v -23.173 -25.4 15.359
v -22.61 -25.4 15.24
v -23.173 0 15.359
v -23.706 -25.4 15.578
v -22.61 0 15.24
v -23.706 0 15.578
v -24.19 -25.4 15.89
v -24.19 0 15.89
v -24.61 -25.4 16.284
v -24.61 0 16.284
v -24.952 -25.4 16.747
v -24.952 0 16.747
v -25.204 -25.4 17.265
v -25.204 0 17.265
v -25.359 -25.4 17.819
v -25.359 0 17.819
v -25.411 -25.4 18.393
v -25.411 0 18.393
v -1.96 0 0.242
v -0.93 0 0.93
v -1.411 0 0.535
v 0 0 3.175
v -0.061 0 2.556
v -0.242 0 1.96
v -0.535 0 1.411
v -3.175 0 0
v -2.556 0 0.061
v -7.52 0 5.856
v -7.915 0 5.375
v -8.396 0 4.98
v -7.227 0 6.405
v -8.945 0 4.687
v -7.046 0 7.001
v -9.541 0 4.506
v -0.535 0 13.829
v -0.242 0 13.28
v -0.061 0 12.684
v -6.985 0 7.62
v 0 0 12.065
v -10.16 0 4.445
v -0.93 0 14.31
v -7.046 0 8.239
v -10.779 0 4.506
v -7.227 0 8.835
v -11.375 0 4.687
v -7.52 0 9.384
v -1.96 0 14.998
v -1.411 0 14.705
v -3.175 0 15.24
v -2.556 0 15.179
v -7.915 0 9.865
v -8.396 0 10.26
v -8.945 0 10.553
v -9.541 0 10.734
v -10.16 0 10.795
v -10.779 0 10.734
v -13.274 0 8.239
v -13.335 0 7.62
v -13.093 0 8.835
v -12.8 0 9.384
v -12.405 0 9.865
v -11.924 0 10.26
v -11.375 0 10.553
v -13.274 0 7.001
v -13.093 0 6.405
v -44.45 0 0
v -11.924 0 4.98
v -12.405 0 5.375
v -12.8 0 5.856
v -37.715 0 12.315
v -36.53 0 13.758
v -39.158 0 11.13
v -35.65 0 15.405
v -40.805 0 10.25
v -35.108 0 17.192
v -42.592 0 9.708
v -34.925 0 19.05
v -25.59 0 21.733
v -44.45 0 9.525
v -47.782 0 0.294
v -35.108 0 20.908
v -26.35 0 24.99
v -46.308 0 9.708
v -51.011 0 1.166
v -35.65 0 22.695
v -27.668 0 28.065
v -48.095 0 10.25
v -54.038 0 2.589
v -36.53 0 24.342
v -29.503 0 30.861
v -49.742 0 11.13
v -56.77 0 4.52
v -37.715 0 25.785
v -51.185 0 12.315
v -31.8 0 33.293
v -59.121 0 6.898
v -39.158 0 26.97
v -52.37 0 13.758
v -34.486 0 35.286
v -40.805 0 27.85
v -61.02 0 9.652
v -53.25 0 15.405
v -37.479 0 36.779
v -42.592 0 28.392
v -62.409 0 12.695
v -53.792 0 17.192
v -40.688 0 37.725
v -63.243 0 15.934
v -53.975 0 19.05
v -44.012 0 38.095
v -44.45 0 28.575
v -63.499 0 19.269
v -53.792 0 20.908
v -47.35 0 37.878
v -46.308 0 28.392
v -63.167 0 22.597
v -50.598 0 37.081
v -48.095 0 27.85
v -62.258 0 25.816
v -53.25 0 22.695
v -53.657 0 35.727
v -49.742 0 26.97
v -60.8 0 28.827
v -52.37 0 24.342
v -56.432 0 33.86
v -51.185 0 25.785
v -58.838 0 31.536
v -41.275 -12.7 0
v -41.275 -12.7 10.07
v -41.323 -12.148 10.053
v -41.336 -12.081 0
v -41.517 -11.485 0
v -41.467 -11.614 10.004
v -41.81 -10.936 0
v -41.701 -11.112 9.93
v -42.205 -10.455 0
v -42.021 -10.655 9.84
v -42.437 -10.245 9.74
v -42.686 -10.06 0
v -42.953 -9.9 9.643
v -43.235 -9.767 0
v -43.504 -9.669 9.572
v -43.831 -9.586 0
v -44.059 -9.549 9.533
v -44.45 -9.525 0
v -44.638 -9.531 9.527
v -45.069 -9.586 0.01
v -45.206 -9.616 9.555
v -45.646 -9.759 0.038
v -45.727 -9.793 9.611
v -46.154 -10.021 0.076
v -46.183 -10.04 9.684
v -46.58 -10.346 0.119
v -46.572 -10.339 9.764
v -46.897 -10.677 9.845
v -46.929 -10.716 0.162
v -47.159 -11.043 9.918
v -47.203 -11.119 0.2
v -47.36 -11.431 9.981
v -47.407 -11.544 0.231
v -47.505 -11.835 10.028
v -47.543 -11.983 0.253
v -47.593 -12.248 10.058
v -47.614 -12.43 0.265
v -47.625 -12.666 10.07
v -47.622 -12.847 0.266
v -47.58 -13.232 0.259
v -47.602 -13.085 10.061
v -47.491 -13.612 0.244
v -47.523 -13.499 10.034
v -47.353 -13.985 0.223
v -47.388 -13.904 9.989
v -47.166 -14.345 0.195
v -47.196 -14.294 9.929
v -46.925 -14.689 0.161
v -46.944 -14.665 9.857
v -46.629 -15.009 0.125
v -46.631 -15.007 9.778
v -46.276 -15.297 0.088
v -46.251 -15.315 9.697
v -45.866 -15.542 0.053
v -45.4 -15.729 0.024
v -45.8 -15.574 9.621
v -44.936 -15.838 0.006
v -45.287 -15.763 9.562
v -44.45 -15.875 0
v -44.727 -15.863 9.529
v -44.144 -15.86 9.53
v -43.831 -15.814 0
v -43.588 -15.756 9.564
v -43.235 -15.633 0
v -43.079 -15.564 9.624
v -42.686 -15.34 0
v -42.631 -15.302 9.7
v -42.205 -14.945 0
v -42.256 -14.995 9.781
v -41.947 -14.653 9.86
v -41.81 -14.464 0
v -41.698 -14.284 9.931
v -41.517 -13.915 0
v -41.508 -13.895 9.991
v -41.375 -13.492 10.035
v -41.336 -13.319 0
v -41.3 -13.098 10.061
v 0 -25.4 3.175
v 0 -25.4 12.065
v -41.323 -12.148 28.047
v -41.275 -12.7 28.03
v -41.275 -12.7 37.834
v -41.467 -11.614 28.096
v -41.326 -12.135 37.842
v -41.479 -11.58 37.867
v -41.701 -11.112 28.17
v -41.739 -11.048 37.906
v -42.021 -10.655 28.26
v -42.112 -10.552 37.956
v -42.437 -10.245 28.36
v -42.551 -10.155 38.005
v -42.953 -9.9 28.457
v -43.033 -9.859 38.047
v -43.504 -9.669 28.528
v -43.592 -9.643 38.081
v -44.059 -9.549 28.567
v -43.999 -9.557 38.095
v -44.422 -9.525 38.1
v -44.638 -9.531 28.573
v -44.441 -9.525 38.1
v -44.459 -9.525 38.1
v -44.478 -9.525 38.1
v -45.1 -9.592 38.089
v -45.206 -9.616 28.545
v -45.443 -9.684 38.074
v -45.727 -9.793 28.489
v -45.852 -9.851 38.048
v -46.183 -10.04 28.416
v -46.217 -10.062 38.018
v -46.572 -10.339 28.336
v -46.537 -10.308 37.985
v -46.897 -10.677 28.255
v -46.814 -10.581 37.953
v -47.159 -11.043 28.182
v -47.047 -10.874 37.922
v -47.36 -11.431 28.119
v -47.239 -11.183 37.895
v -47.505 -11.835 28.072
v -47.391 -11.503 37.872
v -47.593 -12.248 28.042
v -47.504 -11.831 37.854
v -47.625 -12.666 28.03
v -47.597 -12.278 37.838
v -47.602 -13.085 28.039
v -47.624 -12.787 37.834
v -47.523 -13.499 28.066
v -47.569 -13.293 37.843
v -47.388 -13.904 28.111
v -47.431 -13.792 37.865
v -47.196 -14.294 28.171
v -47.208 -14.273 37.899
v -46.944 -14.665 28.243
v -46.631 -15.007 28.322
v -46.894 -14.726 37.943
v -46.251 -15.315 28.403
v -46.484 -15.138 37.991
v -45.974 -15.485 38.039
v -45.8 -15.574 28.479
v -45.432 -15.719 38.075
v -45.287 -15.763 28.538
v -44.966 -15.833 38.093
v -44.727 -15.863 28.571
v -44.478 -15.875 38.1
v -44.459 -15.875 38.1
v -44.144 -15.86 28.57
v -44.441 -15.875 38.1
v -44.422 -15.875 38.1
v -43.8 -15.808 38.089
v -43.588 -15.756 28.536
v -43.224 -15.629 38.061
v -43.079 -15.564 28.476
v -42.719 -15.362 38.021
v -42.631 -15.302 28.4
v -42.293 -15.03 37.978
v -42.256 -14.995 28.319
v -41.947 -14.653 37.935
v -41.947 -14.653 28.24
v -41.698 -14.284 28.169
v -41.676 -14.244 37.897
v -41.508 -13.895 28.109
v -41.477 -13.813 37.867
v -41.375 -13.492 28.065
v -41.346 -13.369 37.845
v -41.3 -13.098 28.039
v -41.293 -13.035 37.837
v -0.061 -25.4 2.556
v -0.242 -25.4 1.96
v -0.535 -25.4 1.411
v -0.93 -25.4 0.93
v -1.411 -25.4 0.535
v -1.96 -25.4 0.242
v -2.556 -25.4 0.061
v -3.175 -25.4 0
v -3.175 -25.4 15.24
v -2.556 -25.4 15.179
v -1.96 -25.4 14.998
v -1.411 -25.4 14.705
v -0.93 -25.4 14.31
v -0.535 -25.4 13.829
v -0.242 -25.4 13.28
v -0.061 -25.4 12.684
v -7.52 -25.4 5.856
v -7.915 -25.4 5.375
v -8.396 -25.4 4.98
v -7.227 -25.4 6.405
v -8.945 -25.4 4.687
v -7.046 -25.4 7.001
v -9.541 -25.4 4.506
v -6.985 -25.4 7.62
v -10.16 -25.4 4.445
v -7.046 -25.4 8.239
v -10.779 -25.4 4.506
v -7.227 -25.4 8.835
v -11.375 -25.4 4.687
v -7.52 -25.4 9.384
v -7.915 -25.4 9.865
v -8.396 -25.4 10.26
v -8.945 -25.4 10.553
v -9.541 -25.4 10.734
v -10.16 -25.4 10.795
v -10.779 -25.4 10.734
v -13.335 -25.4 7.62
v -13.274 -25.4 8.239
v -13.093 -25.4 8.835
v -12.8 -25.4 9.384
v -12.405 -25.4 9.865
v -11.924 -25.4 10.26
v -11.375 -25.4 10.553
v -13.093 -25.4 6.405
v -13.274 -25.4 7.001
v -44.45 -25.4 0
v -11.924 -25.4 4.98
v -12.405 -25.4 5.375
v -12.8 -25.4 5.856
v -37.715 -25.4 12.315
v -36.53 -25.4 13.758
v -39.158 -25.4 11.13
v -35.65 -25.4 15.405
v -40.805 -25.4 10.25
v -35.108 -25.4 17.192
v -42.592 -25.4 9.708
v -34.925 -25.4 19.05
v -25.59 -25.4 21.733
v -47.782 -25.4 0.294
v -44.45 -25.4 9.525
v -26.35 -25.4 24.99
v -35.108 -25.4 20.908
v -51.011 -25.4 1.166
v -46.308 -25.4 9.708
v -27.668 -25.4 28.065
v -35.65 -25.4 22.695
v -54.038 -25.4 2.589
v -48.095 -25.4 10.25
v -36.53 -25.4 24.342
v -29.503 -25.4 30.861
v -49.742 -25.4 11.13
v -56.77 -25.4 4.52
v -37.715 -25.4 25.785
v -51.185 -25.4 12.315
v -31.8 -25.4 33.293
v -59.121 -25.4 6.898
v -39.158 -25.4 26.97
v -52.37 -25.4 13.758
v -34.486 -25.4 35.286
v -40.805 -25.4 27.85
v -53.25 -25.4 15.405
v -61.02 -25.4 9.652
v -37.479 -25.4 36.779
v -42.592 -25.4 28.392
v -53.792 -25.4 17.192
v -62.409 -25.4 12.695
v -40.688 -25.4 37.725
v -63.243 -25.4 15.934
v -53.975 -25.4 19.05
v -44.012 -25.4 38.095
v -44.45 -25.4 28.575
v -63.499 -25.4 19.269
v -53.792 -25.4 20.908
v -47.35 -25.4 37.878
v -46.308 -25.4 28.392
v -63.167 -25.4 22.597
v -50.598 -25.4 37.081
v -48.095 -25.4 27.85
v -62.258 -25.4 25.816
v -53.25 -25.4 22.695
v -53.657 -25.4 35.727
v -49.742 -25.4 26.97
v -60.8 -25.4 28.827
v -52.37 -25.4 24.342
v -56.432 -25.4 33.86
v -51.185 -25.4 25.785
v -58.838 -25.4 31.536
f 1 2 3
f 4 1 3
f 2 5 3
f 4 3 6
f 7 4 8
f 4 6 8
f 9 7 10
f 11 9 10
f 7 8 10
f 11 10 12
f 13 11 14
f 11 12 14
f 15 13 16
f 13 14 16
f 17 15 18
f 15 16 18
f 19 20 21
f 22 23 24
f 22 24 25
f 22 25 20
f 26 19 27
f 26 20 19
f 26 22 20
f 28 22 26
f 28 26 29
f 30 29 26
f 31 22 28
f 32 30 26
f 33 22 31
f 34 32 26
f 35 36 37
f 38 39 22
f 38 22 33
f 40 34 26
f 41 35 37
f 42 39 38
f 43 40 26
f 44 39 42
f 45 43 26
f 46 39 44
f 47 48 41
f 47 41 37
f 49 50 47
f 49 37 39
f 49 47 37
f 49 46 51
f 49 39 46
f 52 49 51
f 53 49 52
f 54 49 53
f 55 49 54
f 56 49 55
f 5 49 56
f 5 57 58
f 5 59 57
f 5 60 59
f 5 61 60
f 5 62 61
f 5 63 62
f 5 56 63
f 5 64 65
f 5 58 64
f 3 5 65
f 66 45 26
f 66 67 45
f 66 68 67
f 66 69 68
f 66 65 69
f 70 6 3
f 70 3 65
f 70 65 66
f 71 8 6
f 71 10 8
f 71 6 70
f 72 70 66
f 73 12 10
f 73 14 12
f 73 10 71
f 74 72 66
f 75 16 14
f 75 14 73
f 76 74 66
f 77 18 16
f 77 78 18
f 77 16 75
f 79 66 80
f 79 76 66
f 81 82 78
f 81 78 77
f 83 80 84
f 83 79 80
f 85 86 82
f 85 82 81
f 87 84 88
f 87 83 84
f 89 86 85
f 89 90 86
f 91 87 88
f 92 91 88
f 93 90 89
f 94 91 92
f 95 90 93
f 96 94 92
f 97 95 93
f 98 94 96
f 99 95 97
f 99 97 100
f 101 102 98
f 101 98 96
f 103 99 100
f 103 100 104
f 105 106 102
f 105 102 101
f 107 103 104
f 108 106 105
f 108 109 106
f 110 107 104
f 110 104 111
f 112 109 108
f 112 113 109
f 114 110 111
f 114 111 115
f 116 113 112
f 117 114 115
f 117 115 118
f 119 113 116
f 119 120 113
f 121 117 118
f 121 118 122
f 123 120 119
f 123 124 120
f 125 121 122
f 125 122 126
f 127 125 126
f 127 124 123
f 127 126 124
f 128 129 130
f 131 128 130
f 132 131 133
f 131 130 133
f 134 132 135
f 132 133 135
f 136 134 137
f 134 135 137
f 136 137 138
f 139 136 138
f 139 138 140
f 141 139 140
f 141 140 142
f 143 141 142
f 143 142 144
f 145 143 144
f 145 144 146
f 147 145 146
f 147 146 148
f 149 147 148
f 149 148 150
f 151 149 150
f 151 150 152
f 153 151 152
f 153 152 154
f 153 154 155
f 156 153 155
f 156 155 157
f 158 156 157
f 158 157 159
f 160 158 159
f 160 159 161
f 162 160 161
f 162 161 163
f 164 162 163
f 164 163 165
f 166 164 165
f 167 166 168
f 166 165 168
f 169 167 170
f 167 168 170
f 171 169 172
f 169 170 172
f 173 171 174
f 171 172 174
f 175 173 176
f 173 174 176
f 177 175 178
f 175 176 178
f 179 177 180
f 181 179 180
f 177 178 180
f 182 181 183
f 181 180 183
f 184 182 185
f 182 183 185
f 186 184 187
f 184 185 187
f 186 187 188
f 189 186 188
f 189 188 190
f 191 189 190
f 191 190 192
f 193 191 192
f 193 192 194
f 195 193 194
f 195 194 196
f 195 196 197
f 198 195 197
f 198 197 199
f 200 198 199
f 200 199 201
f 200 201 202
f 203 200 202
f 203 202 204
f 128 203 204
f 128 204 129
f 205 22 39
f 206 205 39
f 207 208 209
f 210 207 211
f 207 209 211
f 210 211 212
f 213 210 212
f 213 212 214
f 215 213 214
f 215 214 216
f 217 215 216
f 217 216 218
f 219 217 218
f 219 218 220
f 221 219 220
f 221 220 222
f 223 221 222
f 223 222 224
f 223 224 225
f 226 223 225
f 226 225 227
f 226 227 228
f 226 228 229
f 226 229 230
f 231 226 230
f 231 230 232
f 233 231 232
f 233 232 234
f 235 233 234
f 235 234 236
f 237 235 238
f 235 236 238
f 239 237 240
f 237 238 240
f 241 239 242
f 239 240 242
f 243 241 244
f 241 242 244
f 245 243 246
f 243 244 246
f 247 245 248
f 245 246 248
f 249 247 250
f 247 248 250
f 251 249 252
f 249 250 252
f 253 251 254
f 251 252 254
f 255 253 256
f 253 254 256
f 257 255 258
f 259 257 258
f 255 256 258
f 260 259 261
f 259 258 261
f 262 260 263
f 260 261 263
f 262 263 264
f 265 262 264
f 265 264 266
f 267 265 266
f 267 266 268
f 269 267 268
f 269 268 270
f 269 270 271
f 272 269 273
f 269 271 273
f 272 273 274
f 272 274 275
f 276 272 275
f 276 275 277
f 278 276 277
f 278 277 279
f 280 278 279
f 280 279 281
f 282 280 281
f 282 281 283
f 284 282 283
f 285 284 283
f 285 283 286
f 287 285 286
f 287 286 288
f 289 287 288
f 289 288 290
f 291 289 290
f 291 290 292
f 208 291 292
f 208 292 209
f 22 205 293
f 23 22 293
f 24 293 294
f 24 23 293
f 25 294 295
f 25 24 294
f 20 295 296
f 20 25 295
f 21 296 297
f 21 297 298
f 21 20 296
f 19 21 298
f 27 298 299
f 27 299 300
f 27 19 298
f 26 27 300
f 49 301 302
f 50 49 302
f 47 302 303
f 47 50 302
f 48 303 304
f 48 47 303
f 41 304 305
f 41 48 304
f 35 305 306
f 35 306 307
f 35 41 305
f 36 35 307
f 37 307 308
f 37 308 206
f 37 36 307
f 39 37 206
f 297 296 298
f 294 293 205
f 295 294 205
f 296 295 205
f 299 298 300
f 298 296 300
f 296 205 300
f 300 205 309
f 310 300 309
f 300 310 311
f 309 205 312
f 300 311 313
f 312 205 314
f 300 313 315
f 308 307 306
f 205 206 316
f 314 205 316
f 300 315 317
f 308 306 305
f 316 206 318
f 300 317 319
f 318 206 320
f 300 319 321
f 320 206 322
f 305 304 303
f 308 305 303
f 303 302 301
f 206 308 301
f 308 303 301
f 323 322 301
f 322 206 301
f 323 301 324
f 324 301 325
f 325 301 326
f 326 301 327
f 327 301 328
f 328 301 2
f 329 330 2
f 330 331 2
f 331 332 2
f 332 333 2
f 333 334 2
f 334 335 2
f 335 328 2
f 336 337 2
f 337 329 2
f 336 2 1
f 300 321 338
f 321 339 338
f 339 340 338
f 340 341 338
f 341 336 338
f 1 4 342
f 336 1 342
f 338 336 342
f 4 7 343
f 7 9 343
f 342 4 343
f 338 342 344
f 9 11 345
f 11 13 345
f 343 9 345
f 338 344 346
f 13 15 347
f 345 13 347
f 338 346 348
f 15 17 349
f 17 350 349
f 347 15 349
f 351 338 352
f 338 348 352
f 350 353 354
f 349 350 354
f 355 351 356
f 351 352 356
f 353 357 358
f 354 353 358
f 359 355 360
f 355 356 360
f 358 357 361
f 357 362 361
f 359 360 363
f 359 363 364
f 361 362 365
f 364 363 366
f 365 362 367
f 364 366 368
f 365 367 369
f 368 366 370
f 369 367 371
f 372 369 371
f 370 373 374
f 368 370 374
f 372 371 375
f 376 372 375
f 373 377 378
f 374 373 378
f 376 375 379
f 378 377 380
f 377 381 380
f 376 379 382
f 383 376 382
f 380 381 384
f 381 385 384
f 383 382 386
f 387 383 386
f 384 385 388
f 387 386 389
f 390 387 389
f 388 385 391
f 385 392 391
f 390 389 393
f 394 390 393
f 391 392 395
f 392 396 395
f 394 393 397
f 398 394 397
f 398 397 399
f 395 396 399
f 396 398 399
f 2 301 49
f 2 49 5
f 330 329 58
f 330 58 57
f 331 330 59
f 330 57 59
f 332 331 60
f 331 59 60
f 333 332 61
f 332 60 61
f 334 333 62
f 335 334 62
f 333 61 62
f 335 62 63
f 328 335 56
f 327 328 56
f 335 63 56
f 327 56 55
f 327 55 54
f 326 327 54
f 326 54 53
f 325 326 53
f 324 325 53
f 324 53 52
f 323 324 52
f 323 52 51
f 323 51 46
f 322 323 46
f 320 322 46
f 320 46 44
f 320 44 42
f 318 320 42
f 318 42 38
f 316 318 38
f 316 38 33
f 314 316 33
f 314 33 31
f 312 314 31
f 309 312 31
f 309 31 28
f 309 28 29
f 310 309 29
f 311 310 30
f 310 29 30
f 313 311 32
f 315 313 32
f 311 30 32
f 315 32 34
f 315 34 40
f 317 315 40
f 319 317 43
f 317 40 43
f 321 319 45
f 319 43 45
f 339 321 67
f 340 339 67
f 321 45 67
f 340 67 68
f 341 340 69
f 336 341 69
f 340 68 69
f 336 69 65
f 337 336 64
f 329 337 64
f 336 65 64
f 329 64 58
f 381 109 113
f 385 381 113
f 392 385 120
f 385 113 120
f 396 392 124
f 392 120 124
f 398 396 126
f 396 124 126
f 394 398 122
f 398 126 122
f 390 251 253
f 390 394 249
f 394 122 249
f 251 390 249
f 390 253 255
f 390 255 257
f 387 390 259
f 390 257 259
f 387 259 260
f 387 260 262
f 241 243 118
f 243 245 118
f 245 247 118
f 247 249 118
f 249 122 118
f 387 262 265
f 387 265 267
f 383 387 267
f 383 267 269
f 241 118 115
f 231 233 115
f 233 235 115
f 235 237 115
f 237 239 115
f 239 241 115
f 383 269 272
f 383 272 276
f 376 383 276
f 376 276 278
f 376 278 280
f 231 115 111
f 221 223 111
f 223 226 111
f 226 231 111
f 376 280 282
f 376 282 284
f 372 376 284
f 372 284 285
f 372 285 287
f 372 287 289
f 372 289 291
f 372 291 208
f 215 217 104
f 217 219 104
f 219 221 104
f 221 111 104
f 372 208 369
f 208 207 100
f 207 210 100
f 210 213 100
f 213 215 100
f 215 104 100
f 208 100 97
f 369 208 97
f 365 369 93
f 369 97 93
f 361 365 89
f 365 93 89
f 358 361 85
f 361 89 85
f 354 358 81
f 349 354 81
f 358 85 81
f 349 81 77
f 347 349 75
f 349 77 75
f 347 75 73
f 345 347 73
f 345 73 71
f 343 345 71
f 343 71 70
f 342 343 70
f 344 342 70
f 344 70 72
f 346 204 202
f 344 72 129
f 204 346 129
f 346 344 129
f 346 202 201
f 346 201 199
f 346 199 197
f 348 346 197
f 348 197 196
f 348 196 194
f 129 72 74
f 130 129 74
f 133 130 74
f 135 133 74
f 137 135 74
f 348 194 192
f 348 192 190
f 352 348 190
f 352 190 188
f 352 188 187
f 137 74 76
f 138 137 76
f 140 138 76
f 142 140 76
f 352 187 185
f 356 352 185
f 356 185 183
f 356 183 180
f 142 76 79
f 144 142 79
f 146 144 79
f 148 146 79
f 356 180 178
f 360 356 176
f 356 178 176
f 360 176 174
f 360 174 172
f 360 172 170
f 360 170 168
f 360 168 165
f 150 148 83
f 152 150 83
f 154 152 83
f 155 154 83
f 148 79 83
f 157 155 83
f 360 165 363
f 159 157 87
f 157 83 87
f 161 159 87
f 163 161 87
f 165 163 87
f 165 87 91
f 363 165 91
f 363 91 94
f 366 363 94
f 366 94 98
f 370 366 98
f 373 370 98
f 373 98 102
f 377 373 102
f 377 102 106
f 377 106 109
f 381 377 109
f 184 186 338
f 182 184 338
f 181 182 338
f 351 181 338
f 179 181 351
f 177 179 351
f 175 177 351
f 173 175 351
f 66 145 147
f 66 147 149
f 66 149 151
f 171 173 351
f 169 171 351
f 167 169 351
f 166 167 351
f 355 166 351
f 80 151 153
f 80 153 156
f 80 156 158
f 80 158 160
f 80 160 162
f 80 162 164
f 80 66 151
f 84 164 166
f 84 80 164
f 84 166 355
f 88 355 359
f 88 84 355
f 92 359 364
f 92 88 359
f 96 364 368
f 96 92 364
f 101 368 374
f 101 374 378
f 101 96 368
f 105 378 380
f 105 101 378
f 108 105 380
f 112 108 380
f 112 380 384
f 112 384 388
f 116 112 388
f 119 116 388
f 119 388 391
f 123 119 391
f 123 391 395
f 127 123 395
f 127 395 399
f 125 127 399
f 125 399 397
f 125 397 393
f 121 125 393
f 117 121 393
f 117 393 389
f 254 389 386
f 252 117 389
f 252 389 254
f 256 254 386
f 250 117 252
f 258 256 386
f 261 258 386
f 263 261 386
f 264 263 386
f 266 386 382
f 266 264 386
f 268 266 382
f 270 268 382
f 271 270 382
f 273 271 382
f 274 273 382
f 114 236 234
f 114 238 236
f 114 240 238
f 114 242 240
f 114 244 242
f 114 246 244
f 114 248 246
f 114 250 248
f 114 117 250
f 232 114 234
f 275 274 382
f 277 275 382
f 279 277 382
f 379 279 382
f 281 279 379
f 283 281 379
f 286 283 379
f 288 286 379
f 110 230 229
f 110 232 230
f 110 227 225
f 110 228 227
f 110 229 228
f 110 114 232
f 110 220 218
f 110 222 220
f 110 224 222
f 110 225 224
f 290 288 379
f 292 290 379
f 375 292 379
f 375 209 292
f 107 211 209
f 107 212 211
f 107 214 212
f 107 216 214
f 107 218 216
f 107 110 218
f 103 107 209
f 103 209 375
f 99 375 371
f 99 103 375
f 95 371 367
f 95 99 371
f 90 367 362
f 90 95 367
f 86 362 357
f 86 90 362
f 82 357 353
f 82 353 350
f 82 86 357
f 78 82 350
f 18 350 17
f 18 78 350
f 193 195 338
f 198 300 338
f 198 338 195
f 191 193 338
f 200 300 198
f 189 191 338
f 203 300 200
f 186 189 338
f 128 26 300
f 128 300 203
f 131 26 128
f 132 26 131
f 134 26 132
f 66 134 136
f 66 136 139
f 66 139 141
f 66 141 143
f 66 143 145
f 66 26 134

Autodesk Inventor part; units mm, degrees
ref_plane "YZ Plane" through (0, 0, 0) normal (1, 0, 0) x (0, 1, 0)
ref_plane "XZ Plane" through (0, 0, 0) normal (0, 1, 0) x (-1, 0, 0)
ref_plane "XY Plane" through (0, 0, 0) normal (0, 0, 1) x (1, 0, 0)
sketch "Sketch1" plane through (0, 0, 0) normal (0, 0, 1) x (1, 0, 0)
  point P0 (0, 0)
sketch "Sketch2" plane through (0, 0, 0) normal (0, 1, 0) x (-1, 0, 0)
  line L0 (3.175, 0) -> (44.45, 0)
  circle A0 centre (44.45, 19.05) radius 9.525
  arc A1 (44.45, 0) -> (25.4113, 18.3929) centre (44.45, 19.05) ccw
  line L1 (0, 3.175) -> (0, 12.065)
  circle A2 centre (10.16, 7.62) radius 3.175
  line L2 (3.175, 15.24) -> (22.6099, 15.24)
  arc A3 (3.175, 15.24) -> (0, 12.065) centre (3.175, 12.065) ccw
  arc A4 (0, 3.175) -> (3.175, 0) centre (3.175, 3.175) ccw
  arc A5 (22.6099, 15.24) -> (25.4113, 18.3929) centre (22.2363, 18.3929) ccw
  point P0 (0, 0)
  point P1 (0, 15.24)
  dimension "d1" = 44.45
  dimension "d3" = 19.05
  dimension "d4" = 38.1
  dimension "d5" = 15.24
  dimension "d7" = 6.35
  dimension "d8" = 3.175
  dimension "d11" = 3.175
extrude "Extrusion1" add sketch "Sketch2" against normal blind 25.4
ref_plane "Work Plane5" through (-44.45, 0, 38.1) normal (0, 0, 1) x (1, 0, 0)
sketch "Sketch5" plane through (-44.45, 0, 38.1) normal (0, 0, 1) x (1, 0, 0)
  line L0 (-19.05, 0) -> (-19.05, -25.4) projected
  circle A0 centre (0, -12.7) radius 3.175
  point P0 (44.45, 0)
  point P1 (0, -25.4)
  point P2 (19.0387, -25.4)
  dimension "d21" = 6.35
extrude "Extrusion2" cut sketch "Sketch5" against normal through all
properties part number "Assignment 2.6 - Shaft Guide"
